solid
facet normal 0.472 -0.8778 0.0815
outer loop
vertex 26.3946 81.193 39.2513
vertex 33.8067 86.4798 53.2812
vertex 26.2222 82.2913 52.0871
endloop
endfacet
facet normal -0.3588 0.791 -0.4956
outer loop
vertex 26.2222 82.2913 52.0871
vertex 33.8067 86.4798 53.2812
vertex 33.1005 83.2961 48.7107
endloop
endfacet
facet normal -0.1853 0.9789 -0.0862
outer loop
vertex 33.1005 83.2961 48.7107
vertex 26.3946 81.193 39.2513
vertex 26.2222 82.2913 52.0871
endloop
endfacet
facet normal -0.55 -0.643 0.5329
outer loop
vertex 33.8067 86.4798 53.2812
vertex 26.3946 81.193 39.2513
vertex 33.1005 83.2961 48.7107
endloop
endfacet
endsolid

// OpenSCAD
// Auto-generated auxetic polyhedron
points = [
    [26.222180, 82.291267, 52.087112],
    [33.806749, 86.479779, 53.281198],
    [26.394589, 81.193010, 39.251280],
    [33.100519, 83.296141, 48.710726],
];

faces = [
    [0, 1, 2],
    [3, 1, 0],
    [0, 2, 3],
    [3, 2, 1],
];

polyhedron(points = points, faces = faces);
